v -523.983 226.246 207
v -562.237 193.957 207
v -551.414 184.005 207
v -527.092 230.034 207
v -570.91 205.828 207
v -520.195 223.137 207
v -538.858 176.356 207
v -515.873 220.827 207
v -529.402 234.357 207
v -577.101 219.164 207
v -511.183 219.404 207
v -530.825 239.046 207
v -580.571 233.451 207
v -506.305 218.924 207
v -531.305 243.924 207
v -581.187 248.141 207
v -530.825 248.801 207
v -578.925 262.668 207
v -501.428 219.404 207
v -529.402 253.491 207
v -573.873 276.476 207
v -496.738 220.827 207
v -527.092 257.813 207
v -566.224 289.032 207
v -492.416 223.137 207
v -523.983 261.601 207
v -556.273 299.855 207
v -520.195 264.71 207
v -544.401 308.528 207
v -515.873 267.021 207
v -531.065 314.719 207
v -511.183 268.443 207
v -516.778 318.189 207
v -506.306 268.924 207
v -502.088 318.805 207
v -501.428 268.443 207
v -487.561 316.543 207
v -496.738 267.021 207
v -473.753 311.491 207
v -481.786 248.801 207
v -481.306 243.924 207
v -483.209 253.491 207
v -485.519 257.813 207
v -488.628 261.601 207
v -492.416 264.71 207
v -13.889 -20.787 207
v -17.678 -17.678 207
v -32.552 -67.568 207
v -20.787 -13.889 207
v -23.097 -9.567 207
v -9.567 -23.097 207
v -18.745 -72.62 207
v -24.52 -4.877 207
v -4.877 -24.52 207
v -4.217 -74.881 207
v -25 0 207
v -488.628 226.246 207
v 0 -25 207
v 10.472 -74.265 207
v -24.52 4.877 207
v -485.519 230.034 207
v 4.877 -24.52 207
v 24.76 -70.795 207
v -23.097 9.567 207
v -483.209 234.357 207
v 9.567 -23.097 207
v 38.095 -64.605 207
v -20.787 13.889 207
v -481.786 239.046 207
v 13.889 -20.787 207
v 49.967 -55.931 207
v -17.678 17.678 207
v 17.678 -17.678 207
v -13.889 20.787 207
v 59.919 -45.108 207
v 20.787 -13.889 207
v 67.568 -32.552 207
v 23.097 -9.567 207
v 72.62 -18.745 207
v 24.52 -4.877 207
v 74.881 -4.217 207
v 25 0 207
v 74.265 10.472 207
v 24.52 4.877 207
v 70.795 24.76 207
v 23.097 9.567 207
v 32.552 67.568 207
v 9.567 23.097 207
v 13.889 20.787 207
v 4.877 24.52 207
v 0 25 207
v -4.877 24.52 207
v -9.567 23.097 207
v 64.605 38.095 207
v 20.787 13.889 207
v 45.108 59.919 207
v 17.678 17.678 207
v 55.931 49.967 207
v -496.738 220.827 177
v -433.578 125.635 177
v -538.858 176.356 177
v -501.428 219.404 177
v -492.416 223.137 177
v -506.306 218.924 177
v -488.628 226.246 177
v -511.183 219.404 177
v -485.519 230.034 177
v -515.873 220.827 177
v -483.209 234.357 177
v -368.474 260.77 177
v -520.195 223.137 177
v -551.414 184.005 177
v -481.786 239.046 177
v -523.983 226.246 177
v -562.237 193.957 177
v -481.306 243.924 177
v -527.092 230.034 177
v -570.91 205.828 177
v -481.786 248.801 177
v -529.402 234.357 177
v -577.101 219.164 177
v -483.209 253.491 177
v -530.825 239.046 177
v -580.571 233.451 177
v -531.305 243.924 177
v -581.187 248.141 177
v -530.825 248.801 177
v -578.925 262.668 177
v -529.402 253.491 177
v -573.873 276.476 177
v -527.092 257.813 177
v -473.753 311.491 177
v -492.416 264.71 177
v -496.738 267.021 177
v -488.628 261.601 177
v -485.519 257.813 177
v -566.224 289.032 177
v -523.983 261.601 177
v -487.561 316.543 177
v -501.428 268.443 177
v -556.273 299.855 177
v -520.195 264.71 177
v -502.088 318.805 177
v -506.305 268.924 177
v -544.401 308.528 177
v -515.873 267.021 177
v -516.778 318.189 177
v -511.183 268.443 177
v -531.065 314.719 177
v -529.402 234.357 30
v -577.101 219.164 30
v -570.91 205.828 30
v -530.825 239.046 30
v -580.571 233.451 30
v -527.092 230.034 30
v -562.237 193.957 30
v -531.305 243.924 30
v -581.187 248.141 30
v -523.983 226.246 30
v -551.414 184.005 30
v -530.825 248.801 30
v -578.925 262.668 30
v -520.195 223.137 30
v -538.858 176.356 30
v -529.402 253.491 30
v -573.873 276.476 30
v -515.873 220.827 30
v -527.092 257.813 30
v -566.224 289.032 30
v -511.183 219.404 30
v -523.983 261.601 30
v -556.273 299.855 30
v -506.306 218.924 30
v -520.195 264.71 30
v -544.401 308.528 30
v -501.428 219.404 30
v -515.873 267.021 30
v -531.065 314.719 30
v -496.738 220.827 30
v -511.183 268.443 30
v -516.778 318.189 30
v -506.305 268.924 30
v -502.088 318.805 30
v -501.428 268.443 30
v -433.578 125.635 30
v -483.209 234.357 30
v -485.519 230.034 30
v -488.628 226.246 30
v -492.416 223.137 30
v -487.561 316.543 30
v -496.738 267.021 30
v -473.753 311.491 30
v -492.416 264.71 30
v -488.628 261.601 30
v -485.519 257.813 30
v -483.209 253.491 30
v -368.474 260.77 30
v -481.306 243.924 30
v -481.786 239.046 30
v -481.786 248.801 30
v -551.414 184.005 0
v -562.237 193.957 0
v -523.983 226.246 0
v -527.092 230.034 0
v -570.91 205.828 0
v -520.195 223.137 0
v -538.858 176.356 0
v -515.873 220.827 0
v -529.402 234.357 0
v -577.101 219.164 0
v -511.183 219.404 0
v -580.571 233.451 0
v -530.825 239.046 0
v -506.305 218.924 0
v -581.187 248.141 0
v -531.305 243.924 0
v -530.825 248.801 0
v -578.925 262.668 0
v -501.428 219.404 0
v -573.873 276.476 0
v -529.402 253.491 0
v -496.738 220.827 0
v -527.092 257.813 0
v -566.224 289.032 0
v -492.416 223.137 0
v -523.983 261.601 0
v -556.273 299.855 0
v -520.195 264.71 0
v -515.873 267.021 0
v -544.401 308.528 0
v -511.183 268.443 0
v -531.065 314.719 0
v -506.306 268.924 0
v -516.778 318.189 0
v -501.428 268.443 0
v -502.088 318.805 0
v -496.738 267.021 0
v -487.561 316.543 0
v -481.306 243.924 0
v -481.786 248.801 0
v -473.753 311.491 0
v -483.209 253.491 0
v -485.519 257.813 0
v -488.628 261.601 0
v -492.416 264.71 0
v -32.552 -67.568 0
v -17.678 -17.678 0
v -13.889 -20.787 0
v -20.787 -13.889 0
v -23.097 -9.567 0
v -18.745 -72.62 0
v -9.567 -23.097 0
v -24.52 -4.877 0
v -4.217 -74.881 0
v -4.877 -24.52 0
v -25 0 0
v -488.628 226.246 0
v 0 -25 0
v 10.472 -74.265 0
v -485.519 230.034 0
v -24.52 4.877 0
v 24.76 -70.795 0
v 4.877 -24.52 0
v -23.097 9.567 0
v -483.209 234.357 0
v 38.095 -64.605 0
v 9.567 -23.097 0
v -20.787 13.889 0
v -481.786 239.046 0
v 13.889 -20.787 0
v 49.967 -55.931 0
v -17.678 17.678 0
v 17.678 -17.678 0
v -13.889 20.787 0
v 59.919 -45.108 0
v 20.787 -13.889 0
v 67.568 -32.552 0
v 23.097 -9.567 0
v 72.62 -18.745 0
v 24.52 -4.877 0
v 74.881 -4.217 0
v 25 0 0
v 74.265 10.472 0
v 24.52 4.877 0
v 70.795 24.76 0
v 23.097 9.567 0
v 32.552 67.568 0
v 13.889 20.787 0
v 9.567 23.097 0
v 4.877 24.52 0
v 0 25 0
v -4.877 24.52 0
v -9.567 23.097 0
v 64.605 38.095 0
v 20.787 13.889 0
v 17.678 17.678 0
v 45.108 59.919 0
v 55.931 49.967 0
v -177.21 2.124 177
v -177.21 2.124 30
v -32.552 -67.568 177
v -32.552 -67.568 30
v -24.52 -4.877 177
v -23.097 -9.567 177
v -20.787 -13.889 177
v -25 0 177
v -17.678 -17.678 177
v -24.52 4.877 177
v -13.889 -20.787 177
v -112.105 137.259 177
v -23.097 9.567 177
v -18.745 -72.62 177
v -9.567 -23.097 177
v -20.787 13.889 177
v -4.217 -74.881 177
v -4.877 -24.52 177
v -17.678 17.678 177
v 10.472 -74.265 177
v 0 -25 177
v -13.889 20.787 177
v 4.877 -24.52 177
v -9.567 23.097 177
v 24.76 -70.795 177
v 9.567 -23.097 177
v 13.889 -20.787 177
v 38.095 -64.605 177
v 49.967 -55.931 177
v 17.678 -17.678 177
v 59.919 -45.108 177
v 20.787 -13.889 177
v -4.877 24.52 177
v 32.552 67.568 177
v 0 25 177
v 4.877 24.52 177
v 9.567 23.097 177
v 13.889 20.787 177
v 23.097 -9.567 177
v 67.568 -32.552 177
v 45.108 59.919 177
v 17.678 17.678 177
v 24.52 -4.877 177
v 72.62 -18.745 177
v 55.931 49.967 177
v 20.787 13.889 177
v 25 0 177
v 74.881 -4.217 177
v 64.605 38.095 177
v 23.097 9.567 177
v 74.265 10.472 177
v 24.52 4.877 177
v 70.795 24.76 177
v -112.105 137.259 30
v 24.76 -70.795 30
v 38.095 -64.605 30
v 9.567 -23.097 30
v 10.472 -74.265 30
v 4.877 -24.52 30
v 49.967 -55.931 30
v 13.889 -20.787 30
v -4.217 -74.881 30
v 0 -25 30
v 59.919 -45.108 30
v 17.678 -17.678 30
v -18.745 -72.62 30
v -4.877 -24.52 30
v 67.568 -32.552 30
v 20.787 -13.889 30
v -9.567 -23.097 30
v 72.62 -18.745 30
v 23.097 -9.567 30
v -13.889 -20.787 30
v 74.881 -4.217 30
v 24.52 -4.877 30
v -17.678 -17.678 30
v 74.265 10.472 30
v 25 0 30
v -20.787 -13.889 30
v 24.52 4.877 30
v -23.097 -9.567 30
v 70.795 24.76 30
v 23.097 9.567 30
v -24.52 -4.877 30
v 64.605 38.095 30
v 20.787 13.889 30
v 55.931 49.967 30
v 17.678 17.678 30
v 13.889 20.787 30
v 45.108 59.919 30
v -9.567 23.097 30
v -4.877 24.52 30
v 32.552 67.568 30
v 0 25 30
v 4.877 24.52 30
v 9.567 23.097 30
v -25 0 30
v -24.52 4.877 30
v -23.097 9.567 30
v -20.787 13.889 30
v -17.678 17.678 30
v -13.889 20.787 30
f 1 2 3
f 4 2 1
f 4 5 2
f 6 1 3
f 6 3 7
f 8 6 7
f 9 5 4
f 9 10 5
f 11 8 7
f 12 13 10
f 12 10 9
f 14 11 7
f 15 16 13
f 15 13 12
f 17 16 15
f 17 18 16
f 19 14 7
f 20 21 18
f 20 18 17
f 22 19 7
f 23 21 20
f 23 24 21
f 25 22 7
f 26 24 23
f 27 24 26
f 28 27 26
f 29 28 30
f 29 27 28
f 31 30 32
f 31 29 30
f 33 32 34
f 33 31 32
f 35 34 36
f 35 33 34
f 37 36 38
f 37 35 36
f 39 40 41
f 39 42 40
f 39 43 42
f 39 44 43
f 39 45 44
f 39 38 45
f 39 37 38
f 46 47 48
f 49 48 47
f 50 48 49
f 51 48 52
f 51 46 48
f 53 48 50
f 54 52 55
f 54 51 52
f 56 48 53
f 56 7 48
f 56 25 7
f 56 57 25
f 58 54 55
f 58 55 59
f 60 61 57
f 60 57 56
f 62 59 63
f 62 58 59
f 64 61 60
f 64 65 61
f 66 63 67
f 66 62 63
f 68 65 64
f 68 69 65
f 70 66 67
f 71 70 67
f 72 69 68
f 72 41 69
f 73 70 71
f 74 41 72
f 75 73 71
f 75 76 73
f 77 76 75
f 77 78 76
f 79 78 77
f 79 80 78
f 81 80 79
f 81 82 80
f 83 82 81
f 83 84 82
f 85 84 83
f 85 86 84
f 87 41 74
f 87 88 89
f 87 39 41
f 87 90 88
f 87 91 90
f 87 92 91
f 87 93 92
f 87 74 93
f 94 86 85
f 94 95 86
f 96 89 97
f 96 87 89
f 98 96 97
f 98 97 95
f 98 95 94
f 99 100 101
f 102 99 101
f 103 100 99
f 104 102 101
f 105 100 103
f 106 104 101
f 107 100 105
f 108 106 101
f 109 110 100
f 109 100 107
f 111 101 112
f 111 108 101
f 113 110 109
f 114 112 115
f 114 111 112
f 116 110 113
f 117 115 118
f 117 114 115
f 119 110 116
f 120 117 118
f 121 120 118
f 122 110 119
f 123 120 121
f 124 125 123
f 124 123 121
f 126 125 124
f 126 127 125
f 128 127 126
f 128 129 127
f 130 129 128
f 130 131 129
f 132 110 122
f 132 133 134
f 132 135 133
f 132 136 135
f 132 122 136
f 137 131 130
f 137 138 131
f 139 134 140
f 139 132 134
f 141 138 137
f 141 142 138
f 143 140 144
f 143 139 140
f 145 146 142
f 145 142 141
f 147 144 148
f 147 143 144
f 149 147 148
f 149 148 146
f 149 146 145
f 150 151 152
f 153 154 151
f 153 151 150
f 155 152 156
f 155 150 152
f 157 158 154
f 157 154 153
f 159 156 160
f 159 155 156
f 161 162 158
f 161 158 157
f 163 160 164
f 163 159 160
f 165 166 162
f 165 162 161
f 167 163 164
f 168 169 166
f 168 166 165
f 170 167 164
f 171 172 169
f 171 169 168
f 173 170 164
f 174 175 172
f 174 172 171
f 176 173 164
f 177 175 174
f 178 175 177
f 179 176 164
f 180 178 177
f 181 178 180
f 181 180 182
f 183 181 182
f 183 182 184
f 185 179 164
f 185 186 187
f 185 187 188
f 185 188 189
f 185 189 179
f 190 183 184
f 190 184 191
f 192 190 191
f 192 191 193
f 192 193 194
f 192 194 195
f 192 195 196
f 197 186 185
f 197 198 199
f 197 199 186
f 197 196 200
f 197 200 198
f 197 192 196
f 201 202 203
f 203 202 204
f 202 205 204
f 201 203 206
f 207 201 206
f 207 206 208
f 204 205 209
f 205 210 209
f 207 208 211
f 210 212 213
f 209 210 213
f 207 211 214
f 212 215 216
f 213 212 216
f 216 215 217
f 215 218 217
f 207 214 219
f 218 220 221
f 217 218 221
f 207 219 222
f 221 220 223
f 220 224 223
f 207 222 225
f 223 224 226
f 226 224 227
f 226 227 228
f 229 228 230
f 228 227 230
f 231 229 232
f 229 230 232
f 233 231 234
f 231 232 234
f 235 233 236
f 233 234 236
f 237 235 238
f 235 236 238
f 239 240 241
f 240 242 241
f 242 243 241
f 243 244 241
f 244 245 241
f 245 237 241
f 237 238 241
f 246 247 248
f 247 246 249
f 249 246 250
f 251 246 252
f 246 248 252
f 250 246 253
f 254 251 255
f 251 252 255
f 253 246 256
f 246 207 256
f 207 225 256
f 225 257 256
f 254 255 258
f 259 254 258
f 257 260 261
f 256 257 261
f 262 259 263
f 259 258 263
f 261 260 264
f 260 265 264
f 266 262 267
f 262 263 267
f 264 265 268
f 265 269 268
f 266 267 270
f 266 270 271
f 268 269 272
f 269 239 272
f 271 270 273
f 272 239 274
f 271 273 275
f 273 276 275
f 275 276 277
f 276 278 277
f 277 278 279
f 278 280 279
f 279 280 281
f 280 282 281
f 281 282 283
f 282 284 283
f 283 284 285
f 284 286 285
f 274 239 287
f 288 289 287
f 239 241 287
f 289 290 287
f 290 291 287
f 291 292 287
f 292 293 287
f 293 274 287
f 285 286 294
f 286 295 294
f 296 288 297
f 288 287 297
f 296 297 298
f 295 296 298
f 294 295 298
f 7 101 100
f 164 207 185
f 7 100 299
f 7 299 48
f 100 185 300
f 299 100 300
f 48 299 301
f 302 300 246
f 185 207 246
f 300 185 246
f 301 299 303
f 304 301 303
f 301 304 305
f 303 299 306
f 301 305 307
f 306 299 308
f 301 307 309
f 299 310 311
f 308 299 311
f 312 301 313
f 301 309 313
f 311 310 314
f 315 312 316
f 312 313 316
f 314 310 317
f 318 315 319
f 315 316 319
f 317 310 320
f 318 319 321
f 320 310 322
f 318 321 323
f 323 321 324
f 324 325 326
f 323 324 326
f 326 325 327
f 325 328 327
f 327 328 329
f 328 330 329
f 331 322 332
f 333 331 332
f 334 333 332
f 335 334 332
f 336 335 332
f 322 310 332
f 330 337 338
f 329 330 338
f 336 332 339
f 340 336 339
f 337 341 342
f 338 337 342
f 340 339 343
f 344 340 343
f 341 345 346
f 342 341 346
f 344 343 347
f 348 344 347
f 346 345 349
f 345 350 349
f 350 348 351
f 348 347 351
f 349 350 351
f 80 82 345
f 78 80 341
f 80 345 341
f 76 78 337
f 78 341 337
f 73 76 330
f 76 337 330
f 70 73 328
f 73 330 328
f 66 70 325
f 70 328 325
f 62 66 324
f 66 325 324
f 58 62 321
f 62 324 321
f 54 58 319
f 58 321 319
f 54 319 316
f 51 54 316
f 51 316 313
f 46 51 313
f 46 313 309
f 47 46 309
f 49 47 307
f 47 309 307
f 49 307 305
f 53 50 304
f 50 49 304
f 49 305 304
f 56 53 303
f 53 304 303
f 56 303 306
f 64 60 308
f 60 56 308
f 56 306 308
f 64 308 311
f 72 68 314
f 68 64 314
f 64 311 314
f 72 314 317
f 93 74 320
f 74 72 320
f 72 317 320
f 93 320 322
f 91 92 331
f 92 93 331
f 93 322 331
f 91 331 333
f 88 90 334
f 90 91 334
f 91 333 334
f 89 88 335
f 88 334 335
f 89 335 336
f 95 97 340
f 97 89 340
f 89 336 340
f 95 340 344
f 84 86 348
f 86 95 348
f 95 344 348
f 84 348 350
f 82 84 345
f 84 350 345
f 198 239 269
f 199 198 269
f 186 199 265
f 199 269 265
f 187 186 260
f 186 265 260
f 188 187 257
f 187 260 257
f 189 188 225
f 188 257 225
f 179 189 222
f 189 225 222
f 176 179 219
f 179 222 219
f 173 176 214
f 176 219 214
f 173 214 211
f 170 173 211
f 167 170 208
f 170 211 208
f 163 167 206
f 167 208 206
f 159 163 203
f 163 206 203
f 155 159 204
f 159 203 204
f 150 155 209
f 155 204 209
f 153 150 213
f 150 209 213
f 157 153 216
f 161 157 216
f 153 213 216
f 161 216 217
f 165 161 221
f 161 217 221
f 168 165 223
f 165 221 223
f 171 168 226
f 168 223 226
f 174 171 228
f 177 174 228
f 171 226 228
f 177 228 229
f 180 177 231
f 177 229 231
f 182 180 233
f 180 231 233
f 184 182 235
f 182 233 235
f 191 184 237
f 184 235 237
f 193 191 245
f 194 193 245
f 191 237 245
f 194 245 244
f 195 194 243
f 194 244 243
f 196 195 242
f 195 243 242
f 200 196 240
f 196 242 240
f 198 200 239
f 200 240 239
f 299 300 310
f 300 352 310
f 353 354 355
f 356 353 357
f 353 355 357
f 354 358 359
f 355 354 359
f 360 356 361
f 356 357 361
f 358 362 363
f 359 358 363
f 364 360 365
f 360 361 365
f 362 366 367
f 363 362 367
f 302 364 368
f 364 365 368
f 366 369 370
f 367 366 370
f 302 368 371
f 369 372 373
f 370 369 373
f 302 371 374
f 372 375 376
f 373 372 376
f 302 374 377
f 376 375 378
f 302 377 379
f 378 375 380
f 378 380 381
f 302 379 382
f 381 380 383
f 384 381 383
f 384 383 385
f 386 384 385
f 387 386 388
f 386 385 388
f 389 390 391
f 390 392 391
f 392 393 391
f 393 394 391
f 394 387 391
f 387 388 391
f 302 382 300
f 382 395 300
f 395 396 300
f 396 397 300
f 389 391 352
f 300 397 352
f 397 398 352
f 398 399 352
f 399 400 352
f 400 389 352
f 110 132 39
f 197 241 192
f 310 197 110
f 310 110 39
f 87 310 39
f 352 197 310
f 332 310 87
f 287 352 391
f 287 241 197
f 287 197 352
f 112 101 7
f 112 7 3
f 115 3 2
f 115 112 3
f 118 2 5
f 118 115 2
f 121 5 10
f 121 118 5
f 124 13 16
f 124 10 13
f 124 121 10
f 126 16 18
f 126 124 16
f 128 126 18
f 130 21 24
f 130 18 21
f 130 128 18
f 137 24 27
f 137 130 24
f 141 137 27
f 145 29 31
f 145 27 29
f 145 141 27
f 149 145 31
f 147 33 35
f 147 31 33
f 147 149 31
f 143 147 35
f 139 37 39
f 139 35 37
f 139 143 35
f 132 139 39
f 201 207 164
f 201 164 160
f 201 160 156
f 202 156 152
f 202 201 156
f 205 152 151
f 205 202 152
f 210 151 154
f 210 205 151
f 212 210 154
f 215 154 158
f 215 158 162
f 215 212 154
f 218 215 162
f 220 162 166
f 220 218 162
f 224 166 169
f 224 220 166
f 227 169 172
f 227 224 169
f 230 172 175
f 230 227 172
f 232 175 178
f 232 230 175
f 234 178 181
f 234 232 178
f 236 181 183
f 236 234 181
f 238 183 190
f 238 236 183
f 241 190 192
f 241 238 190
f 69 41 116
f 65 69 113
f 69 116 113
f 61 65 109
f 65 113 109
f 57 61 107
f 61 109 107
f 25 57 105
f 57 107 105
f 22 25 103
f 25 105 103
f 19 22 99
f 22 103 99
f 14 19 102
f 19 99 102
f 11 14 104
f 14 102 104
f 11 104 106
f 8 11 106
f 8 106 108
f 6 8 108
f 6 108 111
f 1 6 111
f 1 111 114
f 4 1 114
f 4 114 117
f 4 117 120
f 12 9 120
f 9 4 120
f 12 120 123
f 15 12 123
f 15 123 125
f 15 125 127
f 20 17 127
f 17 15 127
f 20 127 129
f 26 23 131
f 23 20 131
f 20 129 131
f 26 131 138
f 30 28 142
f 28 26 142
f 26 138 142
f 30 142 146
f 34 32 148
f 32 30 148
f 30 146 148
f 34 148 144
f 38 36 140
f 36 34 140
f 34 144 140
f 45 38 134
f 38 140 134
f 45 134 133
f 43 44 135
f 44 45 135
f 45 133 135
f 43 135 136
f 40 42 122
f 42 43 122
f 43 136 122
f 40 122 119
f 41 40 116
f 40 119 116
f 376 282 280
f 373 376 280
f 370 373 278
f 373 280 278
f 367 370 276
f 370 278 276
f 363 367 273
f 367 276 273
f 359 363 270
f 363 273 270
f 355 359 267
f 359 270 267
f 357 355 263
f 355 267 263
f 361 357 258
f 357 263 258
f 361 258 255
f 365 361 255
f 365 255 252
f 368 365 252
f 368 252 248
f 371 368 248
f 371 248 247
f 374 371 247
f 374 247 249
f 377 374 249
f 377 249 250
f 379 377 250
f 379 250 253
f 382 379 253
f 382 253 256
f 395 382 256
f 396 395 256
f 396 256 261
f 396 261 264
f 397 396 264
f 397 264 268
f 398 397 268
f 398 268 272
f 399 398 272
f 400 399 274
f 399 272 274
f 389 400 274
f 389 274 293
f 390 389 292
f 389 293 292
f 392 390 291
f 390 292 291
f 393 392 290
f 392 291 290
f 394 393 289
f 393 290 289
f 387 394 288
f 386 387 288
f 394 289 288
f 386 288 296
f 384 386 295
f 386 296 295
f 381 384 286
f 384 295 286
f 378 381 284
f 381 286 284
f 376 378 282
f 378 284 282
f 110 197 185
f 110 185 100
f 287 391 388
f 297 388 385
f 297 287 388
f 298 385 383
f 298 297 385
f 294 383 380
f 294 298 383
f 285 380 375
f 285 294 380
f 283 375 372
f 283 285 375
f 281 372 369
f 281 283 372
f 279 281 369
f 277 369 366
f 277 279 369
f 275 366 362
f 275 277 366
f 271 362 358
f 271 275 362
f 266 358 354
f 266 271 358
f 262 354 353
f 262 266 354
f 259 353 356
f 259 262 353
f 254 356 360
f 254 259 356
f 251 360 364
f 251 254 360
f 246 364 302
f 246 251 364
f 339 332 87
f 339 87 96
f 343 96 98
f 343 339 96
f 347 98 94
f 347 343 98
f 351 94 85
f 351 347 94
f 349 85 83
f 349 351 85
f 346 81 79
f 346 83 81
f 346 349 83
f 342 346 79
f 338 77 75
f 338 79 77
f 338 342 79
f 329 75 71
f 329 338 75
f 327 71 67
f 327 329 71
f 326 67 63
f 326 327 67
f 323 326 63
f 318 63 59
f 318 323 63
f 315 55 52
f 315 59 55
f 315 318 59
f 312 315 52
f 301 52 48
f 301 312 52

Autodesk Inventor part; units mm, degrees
ref_plane "YZ Plane" through (0, 0, 0) normal (1, 0, 0) x (0, 1, 0)
ref_plane "XZ Plane" through (0, 0, 0) normal (0, 1, 0) x (-1, 0, 0)
ref_plane "XY Plane" through (0, 0, 0) normal (0, 0, 1) x (1, 0, 0)
sketch "Sketch1" plane through (0, 0, 0) normal (0, 0, 1) x (1, 0, 0)
  arc A0 (-32.5521, -67.5675) -> (32.5521, 67.5675) centre (0, 0) ccw
  circle A1 centre (0, 0) radius 25
  arc A2 (-473.7534, 311.4911) -> (-538.8576, 176.3561) centre (-506.3055, 243.9236) ccw
  circle A3 centre (-506.3055, 243.9236) radius 25
  line L0 (-473.7534, 311.4911) -> (32.5521, 67.5675)
  line L1 (-538.8576, 176.3561) -> (-32.5521, -67.5675)
  dimension "d0" = 150
  dimension "d1" = 50
  dimension "d2" = 150
  dimension "d3" = 50
  dimension "d4" = 562
extrude "Extrusion1" add sketch "Sketch1" along normal blind 207
sketch "Sketch2" plane through (-473.7534, 311.4911, 207) normal (0.4340278, 0.9008995, 0) x (0.9008995, -0.4340278, 0)
  line L0 (116.8603, 30) -> (-116.8603, 30)
  line L1 (-116.8603, 30) -> (-116.8603, 177)
  line L2 (-116.8603, 177) -> (116.8603, 177)
  line L3 (116.8603, 177) -> (116.8603, 30)
  line L4 (0, 207) -> (0, 0) projected
  line L5 (116.8603, 30) -> (-116.8603, 177) construction
  line L6 (-116.8603, 30) -> (116.8603, 177) construction
  line L7 (-75, 0) -> (0, 0) projected
  point P0 (562, 207)
  point P1 (0, 103.5)
  dimension "d7" = 30
extrude "Extrusion2" cut sketch "Sketch2" against normal blind 207
sketch "Sketch3" plane through (32.5521, 67.5675, 207) normal (0.4340278, 0.9008995, 0) x (0.9008995, -0.4340278, 0)
  line L0 (110.57, 177) -> (-160.57, 177)
  line L1 (-160.57, 177) -> (-160.57, 30)
  line L2 (-160.57, 30) -> (110.57, 30)
  line L3 (110.57, 30) -> (110.57, 177)
  line L4 (-25, 0) -> (-25, 207) projected
  line L5 (110.57, 177) -> (-160.57, 30) construction
  line L6 (-160.57, 177) -> (110.57, 30) construction
  point P0 (0, 207)
  point P1 (-25, 103.5)
  dimension "d10" = 30
extrude "Extrusion3" cut sketch "Sketch3" against normal blind 207
properties part number "SECOND ARM"
